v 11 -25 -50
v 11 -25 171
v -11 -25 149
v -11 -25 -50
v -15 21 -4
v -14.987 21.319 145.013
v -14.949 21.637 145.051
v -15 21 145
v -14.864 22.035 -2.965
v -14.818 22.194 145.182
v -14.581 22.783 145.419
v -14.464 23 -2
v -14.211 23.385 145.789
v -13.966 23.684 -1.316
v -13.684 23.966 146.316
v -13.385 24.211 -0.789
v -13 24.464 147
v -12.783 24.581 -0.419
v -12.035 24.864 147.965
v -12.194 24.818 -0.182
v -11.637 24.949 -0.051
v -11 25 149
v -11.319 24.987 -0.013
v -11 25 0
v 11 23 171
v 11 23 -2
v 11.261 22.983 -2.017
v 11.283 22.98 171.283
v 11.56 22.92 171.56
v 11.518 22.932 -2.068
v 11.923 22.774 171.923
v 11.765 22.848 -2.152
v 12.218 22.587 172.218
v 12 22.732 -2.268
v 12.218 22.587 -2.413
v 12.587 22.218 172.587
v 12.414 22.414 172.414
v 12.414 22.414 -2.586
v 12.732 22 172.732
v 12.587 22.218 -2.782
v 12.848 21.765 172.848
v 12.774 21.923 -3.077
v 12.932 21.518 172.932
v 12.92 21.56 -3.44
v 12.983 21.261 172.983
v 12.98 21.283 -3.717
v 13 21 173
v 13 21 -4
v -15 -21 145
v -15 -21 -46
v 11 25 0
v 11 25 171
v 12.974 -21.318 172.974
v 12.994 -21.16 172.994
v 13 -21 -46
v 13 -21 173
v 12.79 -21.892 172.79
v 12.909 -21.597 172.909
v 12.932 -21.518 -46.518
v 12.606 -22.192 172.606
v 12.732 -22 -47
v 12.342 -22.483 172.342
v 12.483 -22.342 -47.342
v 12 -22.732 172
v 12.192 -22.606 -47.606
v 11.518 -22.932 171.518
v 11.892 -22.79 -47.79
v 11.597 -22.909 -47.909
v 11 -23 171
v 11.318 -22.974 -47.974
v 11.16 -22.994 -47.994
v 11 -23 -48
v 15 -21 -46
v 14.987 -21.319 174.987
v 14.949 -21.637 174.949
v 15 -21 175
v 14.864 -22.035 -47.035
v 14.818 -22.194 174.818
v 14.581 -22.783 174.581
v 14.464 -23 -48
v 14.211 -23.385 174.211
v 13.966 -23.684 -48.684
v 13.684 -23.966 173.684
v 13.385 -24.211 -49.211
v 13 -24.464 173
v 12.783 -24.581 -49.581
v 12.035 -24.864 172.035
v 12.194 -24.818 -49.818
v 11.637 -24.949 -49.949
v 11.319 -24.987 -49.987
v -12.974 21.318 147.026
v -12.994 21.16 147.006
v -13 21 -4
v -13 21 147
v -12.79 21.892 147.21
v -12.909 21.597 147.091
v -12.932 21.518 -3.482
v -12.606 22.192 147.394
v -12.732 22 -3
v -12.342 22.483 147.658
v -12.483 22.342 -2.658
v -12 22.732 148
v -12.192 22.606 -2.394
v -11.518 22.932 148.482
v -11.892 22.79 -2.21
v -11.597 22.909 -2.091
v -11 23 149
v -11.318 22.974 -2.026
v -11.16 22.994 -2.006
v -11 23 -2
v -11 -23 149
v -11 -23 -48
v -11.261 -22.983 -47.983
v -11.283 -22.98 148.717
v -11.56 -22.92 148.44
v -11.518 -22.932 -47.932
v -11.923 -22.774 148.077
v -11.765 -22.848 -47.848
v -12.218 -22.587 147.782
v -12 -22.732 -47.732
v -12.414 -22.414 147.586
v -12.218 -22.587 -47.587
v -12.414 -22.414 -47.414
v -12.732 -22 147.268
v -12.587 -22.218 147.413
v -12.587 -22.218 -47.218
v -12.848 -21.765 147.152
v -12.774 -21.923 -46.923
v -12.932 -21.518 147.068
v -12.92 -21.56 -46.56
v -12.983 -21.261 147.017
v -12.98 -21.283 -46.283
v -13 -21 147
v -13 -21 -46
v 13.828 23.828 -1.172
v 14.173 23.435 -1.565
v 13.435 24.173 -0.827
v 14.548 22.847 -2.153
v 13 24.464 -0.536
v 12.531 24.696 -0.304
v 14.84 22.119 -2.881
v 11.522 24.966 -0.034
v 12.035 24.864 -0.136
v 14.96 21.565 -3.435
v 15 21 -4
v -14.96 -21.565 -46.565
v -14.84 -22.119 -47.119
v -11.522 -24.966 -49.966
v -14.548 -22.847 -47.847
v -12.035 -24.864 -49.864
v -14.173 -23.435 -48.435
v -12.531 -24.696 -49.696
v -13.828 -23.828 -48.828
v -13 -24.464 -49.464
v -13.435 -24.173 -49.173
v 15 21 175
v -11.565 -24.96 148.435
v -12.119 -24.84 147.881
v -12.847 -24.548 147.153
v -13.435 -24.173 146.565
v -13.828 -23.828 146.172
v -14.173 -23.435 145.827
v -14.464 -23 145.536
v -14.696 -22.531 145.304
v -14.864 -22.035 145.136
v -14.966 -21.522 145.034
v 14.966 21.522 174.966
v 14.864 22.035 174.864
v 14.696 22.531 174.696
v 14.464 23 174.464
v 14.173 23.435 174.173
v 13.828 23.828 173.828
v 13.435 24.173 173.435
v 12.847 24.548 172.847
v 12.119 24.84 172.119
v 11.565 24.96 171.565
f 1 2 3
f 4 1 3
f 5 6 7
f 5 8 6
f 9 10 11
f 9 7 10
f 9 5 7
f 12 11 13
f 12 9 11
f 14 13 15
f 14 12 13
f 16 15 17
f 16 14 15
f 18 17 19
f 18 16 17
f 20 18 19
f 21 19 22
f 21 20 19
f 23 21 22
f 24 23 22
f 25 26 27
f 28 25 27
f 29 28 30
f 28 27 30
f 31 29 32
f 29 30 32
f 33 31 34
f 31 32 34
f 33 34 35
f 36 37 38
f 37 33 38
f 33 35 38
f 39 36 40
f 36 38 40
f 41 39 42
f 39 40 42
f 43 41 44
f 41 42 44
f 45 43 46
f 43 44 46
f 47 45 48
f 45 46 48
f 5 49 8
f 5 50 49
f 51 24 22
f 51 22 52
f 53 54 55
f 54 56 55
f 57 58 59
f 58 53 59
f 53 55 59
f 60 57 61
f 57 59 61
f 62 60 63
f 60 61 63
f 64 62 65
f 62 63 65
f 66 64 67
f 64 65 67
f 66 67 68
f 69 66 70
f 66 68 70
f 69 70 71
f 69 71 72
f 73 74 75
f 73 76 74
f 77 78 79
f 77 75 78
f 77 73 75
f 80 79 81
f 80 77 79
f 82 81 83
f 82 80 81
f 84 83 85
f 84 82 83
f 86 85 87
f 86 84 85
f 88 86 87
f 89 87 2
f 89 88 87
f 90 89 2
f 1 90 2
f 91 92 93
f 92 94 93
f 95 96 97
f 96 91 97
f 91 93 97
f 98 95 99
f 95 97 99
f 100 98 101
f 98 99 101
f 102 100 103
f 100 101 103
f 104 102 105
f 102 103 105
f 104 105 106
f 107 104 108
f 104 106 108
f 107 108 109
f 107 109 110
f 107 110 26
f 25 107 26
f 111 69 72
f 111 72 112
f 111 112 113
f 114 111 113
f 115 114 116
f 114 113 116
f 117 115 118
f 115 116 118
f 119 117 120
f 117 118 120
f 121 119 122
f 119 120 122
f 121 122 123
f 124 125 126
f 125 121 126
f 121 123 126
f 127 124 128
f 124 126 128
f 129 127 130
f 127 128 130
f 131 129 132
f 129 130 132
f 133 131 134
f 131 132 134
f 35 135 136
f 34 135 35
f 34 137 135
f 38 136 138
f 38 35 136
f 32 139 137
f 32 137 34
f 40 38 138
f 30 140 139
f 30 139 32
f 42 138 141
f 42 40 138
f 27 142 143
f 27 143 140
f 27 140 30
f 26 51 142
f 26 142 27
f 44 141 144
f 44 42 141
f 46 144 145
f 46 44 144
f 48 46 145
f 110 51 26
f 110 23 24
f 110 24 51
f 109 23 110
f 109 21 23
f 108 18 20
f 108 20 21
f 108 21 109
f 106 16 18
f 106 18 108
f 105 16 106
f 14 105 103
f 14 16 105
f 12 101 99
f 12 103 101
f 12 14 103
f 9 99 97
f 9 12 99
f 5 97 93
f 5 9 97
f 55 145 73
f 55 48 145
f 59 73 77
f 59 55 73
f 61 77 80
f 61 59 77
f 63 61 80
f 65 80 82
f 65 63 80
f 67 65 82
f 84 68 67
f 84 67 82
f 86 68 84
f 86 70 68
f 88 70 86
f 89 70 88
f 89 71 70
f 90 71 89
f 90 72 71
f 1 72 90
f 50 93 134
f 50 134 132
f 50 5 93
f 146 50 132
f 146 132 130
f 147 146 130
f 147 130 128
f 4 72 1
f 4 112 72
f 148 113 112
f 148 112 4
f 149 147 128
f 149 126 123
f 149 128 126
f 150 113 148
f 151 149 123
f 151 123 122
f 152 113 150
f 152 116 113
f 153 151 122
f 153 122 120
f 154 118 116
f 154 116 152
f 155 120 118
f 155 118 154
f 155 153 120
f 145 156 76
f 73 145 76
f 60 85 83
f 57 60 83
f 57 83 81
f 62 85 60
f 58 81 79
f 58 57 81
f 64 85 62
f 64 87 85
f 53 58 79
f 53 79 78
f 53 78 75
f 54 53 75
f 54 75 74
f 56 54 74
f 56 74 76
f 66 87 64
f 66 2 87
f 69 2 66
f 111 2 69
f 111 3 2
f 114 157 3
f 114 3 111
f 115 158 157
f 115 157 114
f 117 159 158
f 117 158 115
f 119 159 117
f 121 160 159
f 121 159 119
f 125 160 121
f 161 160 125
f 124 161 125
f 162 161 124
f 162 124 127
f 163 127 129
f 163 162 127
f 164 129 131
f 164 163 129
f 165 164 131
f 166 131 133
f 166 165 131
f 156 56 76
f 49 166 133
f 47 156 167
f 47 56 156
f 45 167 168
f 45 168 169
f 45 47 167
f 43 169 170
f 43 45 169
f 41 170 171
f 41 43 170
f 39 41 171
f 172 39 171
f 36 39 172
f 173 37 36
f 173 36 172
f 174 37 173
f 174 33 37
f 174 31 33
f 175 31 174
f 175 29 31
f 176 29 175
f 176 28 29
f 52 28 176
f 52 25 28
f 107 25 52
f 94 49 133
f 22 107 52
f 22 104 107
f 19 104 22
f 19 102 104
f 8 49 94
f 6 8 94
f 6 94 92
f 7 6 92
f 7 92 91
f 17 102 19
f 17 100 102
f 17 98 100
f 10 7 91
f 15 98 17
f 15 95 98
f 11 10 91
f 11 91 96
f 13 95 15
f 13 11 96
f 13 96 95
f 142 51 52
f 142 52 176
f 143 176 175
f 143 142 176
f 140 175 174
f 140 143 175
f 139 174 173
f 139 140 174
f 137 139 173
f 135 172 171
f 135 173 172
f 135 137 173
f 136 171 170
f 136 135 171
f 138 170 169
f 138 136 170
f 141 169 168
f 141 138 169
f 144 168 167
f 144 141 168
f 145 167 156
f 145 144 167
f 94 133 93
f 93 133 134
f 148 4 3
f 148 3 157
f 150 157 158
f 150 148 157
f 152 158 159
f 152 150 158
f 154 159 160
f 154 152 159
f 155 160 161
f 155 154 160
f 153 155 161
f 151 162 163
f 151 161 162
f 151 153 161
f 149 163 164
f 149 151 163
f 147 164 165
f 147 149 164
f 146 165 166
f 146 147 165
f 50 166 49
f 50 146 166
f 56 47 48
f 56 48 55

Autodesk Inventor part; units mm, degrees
ref_plane "Plano inicial" through (0, 0, -50) normal (0, 0, 1) x (1, 0, 0)
ref_plane "Plano final" through (0, 0, 175) normal (0, 0, 1) x (1, 0, 0)
sketch "Rascunho" plane through (0, 0, 0) normal (0, 0, 1) x (1, 0, 0)
  line L0 (-15, -21) -> (-15, 21)
  line L1 (-11, 25) -> (11, 25)
  line L2 (15, 21) -> (15, -21)
  line L3 (11, -25) -> (-11, -25)
  arc A0 (-15, -21) -> (-11, -25) centre (-11, -21) ccw
  arc A1 (15, 21) -> (11, 25) centre (11, 21) ccw
  arc A2 (-11, 25) -> (-15, 21) centre (-11, 21) ccw
  arc A3 (11, -25) -> (15, -21) centre (11, -21) ccw
  arc A4 (-11, 23) -> (-13, 21) centre (-11, 21) ccw
  line L4 (-11, 23) -> (11, 23)
  arc A5 (13, 21) -> (11, 23) centre (11, 21) ccw
  line L5 (13, 21) -> (13, -21)
  arc A6 (11, -23) -> (13, -21) centre (11, -21) ccw
  line L6 (11, -23) -> (-11, -23)
  arc A7 (-13, -21) -> (-11, -23) centre (-11, -21) ccw
  line L7 (-13, -21) -> (-13, 21)
  line L8 (0, 36.1598) -> (0, -36.1598) construction
  line L9 (-22.1598, 0) -> (22.1598, 0) construction
  dimension "d7" = 4
  dimension "d9" = 30
  dimension "d11" = 50
  dimension "d12" = 2
  dimension "d15" = 15
  dimension "d16" = 25
extrude "Corpo" add sketch "Rascunho" along normal up to surface (225 mm away) from surface at -50
sketch "Sketch3" plane through (0, 0, 0) normal (0, 0, 1) x (1, 0, 0)
  line L0 (0, 0) -> (10, 0)
ref_plane "Work Plane3" through (0, 0, 0) normal (0, -1, 0) x (1, 0, 0)
sketch "Sketch4" plane through (0, 0, 0) normal (0, -1, 0) x (1, 0, 0)
  line L0 (-2, -50) -> (12, -50)
  line L1 (-2, 175) -> (12, 175)
  dimension "d18" = 225
ref_plane "Plano de trabalho7" through (0, -25, -50) normal (0, 0.7071, -0.7071) x (1, 0, 0)
split "Dividir4" plane through (0, -25, -50) removes the side toward (0, 0.7071, -0.7071)
ref_plane "Plano de trabalho10" through (15, 0, 175) normal (-0.7071, 0, 0.7071) x (0.7071, 0, 0.7071)
split "Dividir7" plane through (15, 0, 175) removes the side toward (-0.7071, 0, 0.7071)
equation "\"d7\" = G_IR"
equation "\"d9\" = G_W"
equation "\"d11\" = G_H"
equation "\"d12\" = G_T"
equation "\"d15\" = 0.5 * d9"
equation "\"d16\" = 0.5 * d11"
equation "\"d3\" = G_L"
equation "\"G_W\" = 30"
equation "\"G_H\" = 50"
equation "\"G_T\" = 2"
equation "\"G_IR\" = 4"
equation "\"G_L\" = d18"
equation "\"G_OFFSET_END\" = 0"
equation "\"d14\" = G_OFFSET_END + B_L"
equation "\"B_L\" = 175"
properties part number "ISO 4019 - 50x30x2 - 225" material "Aço, suave"
